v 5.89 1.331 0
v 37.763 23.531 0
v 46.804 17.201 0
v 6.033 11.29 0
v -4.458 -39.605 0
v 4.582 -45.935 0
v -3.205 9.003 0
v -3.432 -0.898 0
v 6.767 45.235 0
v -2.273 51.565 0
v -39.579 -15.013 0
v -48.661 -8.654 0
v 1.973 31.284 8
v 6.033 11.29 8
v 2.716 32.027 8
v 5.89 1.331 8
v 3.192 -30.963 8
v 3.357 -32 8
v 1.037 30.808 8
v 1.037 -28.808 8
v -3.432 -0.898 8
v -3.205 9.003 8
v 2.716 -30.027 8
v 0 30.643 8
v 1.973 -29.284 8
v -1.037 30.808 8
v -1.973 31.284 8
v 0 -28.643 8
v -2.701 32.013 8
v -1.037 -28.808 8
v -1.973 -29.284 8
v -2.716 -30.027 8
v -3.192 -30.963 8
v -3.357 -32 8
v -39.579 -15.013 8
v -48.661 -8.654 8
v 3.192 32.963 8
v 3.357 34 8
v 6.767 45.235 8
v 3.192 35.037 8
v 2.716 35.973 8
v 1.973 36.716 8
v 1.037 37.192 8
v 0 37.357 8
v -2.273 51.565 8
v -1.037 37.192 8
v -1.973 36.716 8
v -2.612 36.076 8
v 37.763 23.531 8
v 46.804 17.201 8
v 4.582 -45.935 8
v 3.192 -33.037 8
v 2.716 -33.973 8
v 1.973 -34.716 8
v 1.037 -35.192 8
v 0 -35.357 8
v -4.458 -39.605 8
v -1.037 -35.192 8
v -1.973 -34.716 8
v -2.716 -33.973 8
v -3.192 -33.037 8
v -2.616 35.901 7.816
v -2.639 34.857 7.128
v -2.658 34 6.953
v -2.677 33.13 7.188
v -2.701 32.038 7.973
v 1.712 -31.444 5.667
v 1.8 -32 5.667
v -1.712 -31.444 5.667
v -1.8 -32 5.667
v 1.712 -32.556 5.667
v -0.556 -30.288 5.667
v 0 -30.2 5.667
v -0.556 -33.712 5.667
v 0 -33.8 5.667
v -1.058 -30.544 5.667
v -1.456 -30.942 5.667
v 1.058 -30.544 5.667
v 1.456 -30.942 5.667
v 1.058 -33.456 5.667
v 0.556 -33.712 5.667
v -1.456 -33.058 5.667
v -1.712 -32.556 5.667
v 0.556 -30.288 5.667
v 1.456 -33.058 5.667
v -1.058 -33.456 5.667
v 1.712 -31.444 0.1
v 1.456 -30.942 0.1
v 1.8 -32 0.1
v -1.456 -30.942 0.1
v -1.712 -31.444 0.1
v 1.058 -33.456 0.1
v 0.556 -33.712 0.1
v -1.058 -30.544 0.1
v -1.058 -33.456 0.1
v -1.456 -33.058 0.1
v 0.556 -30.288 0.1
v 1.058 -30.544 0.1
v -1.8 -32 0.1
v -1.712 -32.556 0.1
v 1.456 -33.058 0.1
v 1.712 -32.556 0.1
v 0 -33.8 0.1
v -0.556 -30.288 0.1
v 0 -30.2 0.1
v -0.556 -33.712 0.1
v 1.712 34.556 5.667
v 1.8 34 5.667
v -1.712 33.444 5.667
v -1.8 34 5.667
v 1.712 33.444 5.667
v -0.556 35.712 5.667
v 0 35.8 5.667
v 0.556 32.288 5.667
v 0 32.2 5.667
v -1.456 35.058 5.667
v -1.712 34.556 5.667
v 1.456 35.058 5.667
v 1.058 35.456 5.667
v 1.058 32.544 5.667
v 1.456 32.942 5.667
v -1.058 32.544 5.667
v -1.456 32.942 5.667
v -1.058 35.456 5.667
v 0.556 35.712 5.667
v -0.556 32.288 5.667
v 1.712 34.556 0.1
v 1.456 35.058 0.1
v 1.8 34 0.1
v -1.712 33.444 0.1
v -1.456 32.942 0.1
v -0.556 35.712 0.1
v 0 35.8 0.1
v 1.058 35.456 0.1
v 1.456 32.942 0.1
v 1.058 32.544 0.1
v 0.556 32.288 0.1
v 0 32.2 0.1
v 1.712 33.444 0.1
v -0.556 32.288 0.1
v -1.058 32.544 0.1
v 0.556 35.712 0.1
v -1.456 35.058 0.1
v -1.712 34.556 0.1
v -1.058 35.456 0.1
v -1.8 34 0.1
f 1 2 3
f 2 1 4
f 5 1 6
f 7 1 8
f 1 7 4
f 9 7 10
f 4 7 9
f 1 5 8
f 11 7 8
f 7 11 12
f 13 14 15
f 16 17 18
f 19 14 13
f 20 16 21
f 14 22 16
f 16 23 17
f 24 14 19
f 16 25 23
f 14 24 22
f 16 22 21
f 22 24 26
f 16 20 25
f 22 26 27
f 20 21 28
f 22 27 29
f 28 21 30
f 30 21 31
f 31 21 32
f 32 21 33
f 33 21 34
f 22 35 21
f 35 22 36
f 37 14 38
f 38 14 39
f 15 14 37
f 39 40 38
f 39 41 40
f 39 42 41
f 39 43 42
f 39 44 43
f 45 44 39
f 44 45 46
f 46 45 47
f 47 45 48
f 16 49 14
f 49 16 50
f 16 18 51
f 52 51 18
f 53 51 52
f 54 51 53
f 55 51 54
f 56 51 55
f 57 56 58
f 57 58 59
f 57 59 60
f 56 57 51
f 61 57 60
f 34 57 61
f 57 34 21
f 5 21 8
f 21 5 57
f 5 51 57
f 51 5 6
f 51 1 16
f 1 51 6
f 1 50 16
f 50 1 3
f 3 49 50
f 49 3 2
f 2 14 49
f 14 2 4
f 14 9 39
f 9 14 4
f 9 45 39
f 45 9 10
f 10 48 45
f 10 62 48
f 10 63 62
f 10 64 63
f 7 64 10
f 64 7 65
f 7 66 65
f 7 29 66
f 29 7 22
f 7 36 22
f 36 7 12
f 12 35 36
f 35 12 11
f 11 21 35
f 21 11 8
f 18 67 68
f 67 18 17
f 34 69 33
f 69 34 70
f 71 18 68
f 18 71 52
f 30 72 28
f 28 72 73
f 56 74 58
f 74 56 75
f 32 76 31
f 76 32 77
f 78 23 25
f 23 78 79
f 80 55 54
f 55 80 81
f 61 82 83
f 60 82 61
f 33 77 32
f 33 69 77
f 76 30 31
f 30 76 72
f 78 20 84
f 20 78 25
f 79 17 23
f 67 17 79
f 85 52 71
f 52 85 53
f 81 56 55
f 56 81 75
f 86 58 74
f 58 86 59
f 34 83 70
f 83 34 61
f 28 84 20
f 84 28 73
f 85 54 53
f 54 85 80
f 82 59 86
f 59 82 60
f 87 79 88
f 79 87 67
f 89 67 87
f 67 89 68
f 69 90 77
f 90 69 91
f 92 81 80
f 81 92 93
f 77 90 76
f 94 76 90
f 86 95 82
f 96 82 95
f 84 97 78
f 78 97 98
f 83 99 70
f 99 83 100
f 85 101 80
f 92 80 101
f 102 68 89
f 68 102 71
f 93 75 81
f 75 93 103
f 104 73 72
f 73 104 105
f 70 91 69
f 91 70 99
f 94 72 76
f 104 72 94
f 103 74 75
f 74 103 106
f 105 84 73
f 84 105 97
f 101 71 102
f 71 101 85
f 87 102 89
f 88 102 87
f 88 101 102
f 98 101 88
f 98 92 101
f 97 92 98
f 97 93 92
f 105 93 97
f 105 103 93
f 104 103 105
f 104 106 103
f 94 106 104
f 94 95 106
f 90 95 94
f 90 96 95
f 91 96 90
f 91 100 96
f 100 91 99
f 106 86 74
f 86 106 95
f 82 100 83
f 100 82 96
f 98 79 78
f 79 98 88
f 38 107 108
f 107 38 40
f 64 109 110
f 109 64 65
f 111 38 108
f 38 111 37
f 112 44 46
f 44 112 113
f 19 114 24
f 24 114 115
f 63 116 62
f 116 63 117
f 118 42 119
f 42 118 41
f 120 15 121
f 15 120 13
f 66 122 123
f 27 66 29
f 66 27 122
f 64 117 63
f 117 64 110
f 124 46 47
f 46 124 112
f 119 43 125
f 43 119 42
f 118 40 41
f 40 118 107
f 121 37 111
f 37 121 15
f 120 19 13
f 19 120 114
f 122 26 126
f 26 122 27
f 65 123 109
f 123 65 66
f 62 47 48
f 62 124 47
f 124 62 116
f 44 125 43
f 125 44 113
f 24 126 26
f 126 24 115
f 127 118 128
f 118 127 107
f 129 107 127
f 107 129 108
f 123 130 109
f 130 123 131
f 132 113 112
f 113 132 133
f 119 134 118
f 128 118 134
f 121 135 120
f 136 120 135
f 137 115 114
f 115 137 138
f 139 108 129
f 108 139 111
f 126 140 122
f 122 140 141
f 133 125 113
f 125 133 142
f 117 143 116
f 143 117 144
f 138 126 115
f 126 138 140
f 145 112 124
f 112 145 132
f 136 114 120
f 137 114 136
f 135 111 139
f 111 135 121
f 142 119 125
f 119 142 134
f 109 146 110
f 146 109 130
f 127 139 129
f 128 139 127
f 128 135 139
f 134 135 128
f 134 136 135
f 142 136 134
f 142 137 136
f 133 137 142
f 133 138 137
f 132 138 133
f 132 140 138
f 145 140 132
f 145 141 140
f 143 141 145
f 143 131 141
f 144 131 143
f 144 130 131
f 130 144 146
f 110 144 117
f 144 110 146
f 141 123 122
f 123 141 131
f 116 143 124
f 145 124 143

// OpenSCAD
// Street Numbers for 3D printing
// Charles Tilford, 2019
// License: CC BY-NC-SA 4.0
//   https://creativecommons.org/licenses/by-nc-sa/4.0/

char="X";     // The number/letter to print

// Units are in mm, except for height of letter

// How many inches high should letter be?
inchesHigh=3;
// How thick/deep should letter be (mm)?
depth=8;

// Character coordinates just center the letter
charX=-38;    // Character X coord
charY=-35;    // Character Y coord
topScrew=34;  // Top screw Y coord
botScrew=-32; // Bottom screw Y coord
height=8;     // Thickness of character
// Screw dimensions. Default presumes
// #6 sheet metal screw
screwWid=3.6; // Width of screw shaft
screwTop=6.78;// Width of screw head
screwCon=5.08;// Height of head 'cone'

// Font to print in. Your system needs this
// installed, of course. If changed the hole
// positions almost certainly need to be
// changed, and maybe charX/charY.
fName="Open Sans Extrabold";
// https://fonts.google.com/specimen/Open+Sans
// Designer: Steve Matteson

// Thin floor below holes. My printer was
// struggling to have the hole 'border' stick
// to the stage. Just drill/screw thru it.
holeFloor=0.1; 

// ==========================================
// ===== All values below are auto-calculated
// ==========================================

// Scaled values
scaleFactor=inchesHigh / 3;
cX=charX * scaleFactor;
cY=charY * scaleFactor;
tS=topScrew * scaleFactor;
bS=botScrew * scaleFactor;
// Where do we start drawing screw head cone?
oS=depth - (screwCon-.05);

difference() {
  // We use difference() to punch out the screw holes
  // in the character
    
  // The character itself, 8mm thick
  rotate(a=-35)
  translate([cX,cY,0])
    linear_extrude(height=depth, scale=1)
    text(char, size=(75*scaleFactor),
         $fn=100, font=fName);
    
  // Bottom screw hole
  translate([0,bS,oS]) color("red")
    cylinder(h=screwCon, d2=screwTop,
             d1=0, $fn=20);
   translate([0,bS,holeFloor])
    cylinder(h=20, d=screwWid, $fn=20);
    
  // Top screw hole
  translate([0,tS,oS]) color("red")
    cylinder(h=screwCon, d2=screwTop,
             d1=0, $fn=20);
  translate([0,tS,holeFloor])
    cylinder(h=20, d=screwWid, $fn=20);
}

// Colors are just to aid visualization of
// void spaces. $fn is "featuer number", ie how
// many polygons are devoted to object. The values
// above should be near your printing limit anyway.

// Developed in OpenSCAD
//    https://www.openscad.org/
